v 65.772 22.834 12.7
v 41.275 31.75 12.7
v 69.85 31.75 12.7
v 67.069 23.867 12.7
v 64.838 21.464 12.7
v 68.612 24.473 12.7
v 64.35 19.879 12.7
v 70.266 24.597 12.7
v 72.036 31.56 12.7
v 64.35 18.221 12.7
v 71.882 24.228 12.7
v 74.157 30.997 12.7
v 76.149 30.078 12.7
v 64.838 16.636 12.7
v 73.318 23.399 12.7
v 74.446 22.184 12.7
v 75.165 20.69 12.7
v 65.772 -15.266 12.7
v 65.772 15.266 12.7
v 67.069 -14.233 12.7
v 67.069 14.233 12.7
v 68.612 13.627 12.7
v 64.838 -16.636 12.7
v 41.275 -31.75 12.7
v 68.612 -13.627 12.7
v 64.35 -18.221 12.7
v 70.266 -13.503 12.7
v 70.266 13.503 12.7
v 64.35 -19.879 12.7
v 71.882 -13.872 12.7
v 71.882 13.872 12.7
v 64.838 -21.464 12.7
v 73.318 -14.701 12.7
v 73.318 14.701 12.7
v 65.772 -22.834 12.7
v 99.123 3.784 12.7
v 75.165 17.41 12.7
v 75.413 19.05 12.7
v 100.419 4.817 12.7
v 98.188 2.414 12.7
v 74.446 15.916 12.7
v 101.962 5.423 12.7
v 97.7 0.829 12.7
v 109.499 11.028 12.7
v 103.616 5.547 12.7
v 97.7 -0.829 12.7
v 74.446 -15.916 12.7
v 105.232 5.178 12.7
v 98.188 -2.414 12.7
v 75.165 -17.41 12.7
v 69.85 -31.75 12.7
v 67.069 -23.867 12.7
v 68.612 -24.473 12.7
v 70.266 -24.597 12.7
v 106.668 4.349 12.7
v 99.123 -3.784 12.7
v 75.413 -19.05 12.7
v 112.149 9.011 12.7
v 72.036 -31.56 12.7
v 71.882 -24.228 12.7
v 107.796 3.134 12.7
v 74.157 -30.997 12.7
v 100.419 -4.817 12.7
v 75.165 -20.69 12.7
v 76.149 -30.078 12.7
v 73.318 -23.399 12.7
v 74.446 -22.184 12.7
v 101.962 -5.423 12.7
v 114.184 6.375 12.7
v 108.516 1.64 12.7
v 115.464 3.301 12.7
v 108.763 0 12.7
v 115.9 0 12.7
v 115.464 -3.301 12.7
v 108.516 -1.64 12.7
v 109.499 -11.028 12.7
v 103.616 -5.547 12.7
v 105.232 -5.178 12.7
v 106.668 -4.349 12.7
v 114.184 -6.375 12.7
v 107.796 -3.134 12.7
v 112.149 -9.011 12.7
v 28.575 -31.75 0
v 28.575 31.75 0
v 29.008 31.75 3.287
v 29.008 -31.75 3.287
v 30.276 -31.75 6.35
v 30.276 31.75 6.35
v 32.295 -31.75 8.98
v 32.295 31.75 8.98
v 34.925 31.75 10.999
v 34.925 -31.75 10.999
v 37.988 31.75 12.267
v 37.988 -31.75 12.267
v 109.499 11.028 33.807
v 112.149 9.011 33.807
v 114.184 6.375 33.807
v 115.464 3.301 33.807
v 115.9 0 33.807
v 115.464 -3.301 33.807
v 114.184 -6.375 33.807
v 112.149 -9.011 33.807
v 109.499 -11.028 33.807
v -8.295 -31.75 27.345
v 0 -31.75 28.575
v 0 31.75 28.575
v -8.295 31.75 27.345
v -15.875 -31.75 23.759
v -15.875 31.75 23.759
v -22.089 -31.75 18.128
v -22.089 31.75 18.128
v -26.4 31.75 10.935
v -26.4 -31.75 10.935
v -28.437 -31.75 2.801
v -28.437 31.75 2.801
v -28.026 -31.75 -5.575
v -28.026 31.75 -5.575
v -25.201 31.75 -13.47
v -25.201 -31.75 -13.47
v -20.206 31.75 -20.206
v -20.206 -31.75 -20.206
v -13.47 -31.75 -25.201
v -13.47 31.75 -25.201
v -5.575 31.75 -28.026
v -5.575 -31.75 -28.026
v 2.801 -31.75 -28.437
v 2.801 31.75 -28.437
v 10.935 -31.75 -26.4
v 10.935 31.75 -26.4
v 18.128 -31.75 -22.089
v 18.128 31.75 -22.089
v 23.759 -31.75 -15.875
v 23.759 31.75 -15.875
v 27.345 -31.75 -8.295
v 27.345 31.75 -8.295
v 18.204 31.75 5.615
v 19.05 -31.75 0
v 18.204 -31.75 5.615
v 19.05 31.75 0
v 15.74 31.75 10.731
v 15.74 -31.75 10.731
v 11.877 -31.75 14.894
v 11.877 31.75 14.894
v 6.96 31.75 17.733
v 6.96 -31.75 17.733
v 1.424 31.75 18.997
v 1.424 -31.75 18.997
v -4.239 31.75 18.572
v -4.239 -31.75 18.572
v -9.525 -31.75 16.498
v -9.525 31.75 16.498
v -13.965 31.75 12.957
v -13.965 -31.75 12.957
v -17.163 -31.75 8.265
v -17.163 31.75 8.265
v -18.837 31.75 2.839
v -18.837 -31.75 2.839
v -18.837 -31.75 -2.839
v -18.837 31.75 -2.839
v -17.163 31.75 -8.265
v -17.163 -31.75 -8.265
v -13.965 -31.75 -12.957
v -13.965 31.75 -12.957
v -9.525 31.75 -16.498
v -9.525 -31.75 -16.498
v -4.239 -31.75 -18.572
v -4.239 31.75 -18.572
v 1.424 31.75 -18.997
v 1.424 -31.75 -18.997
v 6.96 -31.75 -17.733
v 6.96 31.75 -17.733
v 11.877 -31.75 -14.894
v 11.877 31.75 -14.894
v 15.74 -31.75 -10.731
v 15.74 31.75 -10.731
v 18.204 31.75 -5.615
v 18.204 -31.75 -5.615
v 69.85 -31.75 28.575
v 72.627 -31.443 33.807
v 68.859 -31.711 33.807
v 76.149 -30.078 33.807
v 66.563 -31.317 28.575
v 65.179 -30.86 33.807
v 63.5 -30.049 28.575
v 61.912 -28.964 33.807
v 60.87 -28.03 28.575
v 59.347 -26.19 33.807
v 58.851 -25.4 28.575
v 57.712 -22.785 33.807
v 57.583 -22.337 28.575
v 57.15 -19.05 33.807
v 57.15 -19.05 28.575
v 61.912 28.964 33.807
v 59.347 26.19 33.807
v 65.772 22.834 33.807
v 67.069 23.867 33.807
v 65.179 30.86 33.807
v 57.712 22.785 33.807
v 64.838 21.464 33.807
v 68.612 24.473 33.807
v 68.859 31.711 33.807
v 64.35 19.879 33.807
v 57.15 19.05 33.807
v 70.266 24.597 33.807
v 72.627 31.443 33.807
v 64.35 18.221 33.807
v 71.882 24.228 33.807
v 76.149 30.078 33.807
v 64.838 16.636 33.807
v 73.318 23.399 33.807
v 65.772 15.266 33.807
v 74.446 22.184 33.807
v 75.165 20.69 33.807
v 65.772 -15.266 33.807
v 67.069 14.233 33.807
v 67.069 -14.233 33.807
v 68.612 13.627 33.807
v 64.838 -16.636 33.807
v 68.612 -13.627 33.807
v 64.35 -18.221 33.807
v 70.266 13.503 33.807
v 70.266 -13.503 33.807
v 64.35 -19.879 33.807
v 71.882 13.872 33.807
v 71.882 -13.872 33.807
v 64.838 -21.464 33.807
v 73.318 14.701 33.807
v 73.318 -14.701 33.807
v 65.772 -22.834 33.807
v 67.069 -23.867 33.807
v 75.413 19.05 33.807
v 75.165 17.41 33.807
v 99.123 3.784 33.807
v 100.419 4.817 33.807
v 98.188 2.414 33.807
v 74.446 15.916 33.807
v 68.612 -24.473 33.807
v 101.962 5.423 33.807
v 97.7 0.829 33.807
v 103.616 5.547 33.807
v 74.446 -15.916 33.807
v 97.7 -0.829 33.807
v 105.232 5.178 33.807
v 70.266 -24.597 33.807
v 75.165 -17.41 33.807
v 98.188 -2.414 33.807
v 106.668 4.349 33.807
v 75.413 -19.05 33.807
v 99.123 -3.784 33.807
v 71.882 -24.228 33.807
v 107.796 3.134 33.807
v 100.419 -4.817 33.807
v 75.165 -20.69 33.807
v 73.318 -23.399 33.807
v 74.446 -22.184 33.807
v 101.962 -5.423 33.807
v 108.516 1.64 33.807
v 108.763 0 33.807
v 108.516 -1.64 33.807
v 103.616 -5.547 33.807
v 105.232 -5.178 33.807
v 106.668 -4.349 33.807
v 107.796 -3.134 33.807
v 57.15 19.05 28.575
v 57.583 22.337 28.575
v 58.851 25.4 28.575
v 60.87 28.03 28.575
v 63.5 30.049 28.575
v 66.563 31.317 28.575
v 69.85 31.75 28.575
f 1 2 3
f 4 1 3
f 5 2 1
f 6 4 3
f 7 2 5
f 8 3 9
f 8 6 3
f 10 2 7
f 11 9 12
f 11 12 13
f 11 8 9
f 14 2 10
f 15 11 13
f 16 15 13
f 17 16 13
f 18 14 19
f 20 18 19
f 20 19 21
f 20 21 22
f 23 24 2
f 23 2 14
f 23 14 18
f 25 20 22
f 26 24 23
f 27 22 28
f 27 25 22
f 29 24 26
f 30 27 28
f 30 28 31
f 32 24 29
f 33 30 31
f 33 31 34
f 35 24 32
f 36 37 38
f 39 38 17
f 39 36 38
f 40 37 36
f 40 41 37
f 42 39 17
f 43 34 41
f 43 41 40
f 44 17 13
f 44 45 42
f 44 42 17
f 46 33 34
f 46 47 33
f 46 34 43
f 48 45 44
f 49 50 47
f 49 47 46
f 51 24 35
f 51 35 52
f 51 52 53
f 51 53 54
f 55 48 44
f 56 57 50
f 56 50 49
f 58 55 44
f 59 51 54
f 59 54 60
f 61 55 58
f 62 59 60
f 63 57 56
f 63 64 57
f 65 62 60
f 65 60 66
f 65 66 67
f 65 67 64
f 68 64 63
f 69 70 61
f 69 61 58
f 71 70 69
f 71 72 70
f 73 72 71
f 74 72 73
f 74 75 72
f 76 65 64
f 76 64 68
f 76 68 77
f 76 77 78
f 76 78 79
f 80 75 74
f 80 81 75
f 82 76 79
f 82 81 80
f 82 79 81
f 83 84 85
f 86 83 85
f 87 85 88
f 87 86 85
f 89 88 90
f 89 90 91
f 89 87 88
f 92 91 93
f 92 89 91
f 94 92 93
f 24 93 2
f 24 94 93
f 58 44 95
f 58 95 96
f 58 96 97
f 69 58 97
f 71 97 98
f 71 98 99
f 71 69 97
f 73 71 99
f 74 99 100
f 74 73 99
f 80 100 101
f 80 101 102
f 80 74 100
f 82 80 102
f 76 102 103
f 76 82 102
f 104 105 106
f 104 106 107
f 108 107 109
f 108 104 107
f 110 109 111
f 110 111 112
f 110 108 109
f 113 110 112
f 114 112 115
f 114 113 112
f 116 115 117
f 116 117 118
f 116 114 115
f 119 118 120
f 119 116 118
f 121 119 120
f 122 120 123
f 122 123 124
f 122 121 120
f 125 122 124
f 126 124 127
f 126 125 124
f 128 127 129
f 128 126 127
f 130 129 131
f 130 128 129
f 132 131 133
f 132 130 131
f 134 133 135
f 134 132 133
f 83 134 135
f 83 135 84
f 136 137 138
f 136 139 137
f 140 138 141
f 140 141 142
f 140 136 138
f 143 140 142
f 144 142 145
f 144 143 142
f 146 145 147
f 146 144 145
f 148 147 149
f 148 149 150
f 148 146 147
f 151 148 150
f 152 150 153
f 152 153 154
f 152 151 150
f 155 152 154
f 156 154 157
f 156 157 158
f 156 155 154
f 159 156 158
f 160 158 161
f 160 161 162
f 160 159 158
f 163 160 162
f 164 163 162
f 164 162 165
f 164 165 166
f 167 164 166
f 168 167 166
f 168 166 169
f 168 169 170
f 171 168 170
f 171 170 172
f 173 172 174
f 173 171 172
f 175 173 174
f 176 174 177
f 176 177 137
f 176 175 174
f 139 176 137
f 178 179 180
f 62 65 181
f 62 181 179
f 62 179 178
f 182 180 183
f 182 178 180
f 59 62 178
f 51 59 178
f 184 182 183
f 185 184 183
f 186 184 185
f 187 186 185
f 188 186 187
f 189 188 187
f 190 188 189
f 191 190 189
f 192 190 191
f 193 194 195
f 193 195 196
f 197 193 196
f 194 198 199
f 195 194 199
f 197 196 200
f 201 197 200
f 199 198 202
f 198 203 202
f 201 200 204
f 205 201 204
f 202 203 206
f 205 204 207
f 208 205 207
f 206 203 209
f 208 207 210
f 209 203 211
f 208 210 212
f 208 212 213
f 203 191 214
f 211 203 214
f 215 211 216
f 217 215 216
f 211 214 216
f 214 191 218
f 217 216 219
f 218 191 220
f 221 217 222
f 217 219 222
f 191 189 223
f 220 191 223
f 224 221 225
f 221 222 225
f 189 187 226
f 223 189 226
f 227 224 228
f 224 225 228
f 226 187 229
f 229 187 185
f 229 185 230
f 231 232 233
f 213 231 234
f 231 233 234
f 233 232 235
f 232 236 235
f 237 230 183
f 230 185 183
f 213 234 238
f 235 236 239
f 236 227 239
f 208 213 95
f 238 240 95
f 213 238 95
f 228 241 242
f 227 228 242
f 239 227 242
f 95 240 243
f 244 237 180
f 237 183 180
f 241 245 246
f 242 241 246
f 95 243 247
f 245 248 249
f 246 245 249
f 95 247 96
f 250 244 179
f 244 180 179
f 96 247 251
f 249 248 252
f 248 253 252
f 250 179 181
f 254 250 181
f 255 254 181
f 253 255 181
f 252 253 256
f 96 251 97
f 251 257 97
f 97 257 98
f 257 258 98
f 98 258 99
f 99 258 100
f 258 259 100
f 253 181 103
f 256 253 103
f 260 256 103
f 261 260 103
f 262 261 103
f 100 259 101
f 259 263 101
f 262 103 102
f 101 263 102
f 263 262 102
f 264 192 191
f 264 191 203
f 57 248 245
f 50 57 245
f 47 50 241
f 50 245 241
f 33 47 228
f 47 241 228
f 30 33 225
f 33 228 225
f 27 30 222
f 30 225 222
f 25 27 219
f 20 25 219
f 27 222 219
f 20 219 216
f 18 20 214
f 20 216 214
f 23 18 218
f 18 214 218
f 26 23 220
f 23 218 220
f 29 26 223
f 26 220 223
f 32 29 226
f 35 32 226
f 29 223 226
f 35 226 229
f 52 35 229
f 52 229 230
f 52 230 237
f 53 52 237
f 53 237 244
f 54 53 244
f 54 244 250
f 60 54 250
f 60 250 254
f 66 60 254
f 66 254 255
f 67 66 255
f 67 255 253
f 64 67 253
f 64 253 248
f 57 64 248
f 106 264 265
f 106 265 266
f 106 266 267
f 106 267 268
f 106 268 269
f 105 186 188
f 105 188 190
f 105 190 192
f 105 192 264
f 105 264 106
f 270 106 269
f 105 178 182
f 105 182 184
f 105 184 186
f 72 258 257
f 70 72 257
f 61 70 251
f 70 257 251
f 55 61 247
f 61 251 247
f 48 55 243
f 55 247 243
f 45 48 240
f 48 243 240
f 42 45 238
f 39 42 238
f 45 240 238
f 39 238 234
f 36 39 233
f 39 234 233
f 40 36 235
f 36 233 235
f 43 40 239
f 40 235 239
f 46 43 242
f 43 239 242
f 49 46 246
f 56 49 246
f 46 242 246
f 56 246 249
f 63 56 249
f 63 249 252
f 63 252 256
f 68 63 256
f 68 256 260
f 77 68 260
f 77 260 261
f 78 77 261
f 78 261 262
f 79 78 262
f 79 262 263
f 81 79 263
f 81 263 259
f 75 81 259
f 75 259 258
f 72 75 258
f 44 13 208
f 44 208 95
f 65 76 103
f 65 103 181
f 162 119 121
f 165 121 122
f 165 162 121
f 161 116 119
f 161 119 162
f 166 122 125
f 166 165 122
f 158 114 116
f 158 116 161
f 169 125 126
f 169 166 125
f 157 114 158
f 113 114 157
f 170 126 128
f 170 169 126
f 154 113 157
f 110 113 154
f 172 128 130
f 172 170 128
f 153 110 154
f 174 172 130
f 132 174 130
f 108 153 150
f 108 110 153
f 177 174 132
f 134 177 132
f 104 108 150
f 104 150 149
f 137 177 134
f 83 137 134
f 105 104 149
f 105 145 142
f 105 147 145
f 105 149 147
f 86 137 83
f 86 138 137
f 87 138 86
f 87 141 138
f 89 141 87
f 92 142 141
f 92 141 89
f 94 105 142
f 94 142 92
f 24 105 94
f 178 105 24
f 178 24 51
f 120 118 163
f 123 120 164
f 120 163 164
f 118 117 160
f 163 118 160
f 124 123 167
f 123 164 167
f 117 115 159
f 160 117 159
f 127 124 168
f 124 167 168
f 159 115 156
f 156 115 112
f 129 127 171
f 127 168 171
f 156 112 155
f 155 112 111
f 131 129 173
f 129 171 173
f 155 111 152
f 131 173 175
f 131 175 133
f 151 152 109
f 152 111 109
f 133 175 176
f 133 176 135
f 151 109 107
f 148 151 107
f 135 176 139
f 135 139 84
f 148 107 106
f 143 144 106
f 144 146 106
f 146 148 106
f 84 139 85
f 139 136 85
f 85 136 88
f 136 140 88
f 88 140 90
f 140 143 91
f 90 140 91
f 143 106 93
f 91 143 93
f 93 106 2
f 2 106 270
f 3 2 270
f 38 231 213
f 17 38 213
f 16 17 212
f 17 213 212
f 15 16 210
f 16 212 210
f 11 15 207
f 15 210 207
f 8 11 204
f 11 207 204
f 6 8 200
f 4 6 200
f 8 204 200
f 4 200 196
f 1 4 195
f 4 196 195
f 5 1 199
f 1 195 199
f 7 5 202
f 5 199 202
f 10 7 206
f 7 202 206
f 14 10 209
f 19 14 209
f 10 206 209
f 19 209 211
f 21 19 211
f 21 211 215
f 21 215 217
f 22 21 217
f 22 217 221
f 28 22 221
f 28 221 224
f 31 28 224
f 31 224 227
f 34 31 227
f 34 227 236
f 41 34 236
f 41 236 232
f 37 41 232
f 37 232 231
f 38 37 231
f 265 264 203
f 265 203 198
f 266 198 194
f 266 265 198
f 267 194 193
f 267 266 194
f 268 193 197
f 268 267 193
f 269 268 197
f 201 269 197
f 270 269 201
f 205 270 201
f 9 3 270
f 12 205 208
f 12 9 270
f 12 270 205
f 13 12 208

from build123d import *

# Parameters (mm, degrees)
F0_R     = 19.05
F1_DEPTH = 31.75
F3_DEPTH = 21.1074
F4_R     = 5.5626
F5_DEPTH = 62.3834


with BuildPart() as f1:
    # F0 (on Front) → F1 (new body, symmetric)
    with BuildSketch(Plane.XZ):
        with BuildLine():
            Line((69.85, 28.575), (0, 28.575))
            ThreePointArc((0, 28.575), (-20.205576, -20.205576), (28.575, 0))
            ThreePointArc((28.575, 0), (32.294744, 8.980256), (41.275, 12.7))
            Line((41.275, 12.7), (69.85, 12.7))
            Line((69.85, 12.7), (69.85, 28.575))
        make_face()
        Circle(F0_R, mode=Mode.SUBTRACT)
    extrude(amount=F1_DEPTH, both=True)

    # F2 (on face) → F3 (join)
    with BuildSketch(Plane(origin=(0, 0, 12.7), x_dir=(1, 0, 0), z_dir=(0, 0, -1))):
        with BuildLine():
            ThreePointArc((76.149155, 30.077721), (63.474628, 30.033835), (57.15, 19.05))
            Line((57.15, 19.05), (57.15, -19.05))
            ThreePointArc((57.15, -19.05), (63.474628, -30.033835), (76.149155, -30.077721))
            Line((76.149155, -30.077721), (109.499355, -11.027721))
            ThreePointArc((109.499355, -11.027721), (115.9002, 0), (109.499355, 11.027721))
            Line((109.499355, 11.027721), (76.149155, 30.077721))
        make_face()
    extrude(amount=-F3_DEPTH)

    # F4 (on face) → F5 (cut, through all)
    with BuildSketch(Plane.XY.offset(33.8074)):
        with Locations((103.2002, 0)):
            Circle(F4_R)
        with Locations((69.85, -19.05)):
            Circle(F4_R)
        with Locations((69.85, 19.05)):
            Circle(F4_R)
    extrude(amount=-F5_DEPTH, mode=Mode.SUBTRACT)


solid = f1.part
